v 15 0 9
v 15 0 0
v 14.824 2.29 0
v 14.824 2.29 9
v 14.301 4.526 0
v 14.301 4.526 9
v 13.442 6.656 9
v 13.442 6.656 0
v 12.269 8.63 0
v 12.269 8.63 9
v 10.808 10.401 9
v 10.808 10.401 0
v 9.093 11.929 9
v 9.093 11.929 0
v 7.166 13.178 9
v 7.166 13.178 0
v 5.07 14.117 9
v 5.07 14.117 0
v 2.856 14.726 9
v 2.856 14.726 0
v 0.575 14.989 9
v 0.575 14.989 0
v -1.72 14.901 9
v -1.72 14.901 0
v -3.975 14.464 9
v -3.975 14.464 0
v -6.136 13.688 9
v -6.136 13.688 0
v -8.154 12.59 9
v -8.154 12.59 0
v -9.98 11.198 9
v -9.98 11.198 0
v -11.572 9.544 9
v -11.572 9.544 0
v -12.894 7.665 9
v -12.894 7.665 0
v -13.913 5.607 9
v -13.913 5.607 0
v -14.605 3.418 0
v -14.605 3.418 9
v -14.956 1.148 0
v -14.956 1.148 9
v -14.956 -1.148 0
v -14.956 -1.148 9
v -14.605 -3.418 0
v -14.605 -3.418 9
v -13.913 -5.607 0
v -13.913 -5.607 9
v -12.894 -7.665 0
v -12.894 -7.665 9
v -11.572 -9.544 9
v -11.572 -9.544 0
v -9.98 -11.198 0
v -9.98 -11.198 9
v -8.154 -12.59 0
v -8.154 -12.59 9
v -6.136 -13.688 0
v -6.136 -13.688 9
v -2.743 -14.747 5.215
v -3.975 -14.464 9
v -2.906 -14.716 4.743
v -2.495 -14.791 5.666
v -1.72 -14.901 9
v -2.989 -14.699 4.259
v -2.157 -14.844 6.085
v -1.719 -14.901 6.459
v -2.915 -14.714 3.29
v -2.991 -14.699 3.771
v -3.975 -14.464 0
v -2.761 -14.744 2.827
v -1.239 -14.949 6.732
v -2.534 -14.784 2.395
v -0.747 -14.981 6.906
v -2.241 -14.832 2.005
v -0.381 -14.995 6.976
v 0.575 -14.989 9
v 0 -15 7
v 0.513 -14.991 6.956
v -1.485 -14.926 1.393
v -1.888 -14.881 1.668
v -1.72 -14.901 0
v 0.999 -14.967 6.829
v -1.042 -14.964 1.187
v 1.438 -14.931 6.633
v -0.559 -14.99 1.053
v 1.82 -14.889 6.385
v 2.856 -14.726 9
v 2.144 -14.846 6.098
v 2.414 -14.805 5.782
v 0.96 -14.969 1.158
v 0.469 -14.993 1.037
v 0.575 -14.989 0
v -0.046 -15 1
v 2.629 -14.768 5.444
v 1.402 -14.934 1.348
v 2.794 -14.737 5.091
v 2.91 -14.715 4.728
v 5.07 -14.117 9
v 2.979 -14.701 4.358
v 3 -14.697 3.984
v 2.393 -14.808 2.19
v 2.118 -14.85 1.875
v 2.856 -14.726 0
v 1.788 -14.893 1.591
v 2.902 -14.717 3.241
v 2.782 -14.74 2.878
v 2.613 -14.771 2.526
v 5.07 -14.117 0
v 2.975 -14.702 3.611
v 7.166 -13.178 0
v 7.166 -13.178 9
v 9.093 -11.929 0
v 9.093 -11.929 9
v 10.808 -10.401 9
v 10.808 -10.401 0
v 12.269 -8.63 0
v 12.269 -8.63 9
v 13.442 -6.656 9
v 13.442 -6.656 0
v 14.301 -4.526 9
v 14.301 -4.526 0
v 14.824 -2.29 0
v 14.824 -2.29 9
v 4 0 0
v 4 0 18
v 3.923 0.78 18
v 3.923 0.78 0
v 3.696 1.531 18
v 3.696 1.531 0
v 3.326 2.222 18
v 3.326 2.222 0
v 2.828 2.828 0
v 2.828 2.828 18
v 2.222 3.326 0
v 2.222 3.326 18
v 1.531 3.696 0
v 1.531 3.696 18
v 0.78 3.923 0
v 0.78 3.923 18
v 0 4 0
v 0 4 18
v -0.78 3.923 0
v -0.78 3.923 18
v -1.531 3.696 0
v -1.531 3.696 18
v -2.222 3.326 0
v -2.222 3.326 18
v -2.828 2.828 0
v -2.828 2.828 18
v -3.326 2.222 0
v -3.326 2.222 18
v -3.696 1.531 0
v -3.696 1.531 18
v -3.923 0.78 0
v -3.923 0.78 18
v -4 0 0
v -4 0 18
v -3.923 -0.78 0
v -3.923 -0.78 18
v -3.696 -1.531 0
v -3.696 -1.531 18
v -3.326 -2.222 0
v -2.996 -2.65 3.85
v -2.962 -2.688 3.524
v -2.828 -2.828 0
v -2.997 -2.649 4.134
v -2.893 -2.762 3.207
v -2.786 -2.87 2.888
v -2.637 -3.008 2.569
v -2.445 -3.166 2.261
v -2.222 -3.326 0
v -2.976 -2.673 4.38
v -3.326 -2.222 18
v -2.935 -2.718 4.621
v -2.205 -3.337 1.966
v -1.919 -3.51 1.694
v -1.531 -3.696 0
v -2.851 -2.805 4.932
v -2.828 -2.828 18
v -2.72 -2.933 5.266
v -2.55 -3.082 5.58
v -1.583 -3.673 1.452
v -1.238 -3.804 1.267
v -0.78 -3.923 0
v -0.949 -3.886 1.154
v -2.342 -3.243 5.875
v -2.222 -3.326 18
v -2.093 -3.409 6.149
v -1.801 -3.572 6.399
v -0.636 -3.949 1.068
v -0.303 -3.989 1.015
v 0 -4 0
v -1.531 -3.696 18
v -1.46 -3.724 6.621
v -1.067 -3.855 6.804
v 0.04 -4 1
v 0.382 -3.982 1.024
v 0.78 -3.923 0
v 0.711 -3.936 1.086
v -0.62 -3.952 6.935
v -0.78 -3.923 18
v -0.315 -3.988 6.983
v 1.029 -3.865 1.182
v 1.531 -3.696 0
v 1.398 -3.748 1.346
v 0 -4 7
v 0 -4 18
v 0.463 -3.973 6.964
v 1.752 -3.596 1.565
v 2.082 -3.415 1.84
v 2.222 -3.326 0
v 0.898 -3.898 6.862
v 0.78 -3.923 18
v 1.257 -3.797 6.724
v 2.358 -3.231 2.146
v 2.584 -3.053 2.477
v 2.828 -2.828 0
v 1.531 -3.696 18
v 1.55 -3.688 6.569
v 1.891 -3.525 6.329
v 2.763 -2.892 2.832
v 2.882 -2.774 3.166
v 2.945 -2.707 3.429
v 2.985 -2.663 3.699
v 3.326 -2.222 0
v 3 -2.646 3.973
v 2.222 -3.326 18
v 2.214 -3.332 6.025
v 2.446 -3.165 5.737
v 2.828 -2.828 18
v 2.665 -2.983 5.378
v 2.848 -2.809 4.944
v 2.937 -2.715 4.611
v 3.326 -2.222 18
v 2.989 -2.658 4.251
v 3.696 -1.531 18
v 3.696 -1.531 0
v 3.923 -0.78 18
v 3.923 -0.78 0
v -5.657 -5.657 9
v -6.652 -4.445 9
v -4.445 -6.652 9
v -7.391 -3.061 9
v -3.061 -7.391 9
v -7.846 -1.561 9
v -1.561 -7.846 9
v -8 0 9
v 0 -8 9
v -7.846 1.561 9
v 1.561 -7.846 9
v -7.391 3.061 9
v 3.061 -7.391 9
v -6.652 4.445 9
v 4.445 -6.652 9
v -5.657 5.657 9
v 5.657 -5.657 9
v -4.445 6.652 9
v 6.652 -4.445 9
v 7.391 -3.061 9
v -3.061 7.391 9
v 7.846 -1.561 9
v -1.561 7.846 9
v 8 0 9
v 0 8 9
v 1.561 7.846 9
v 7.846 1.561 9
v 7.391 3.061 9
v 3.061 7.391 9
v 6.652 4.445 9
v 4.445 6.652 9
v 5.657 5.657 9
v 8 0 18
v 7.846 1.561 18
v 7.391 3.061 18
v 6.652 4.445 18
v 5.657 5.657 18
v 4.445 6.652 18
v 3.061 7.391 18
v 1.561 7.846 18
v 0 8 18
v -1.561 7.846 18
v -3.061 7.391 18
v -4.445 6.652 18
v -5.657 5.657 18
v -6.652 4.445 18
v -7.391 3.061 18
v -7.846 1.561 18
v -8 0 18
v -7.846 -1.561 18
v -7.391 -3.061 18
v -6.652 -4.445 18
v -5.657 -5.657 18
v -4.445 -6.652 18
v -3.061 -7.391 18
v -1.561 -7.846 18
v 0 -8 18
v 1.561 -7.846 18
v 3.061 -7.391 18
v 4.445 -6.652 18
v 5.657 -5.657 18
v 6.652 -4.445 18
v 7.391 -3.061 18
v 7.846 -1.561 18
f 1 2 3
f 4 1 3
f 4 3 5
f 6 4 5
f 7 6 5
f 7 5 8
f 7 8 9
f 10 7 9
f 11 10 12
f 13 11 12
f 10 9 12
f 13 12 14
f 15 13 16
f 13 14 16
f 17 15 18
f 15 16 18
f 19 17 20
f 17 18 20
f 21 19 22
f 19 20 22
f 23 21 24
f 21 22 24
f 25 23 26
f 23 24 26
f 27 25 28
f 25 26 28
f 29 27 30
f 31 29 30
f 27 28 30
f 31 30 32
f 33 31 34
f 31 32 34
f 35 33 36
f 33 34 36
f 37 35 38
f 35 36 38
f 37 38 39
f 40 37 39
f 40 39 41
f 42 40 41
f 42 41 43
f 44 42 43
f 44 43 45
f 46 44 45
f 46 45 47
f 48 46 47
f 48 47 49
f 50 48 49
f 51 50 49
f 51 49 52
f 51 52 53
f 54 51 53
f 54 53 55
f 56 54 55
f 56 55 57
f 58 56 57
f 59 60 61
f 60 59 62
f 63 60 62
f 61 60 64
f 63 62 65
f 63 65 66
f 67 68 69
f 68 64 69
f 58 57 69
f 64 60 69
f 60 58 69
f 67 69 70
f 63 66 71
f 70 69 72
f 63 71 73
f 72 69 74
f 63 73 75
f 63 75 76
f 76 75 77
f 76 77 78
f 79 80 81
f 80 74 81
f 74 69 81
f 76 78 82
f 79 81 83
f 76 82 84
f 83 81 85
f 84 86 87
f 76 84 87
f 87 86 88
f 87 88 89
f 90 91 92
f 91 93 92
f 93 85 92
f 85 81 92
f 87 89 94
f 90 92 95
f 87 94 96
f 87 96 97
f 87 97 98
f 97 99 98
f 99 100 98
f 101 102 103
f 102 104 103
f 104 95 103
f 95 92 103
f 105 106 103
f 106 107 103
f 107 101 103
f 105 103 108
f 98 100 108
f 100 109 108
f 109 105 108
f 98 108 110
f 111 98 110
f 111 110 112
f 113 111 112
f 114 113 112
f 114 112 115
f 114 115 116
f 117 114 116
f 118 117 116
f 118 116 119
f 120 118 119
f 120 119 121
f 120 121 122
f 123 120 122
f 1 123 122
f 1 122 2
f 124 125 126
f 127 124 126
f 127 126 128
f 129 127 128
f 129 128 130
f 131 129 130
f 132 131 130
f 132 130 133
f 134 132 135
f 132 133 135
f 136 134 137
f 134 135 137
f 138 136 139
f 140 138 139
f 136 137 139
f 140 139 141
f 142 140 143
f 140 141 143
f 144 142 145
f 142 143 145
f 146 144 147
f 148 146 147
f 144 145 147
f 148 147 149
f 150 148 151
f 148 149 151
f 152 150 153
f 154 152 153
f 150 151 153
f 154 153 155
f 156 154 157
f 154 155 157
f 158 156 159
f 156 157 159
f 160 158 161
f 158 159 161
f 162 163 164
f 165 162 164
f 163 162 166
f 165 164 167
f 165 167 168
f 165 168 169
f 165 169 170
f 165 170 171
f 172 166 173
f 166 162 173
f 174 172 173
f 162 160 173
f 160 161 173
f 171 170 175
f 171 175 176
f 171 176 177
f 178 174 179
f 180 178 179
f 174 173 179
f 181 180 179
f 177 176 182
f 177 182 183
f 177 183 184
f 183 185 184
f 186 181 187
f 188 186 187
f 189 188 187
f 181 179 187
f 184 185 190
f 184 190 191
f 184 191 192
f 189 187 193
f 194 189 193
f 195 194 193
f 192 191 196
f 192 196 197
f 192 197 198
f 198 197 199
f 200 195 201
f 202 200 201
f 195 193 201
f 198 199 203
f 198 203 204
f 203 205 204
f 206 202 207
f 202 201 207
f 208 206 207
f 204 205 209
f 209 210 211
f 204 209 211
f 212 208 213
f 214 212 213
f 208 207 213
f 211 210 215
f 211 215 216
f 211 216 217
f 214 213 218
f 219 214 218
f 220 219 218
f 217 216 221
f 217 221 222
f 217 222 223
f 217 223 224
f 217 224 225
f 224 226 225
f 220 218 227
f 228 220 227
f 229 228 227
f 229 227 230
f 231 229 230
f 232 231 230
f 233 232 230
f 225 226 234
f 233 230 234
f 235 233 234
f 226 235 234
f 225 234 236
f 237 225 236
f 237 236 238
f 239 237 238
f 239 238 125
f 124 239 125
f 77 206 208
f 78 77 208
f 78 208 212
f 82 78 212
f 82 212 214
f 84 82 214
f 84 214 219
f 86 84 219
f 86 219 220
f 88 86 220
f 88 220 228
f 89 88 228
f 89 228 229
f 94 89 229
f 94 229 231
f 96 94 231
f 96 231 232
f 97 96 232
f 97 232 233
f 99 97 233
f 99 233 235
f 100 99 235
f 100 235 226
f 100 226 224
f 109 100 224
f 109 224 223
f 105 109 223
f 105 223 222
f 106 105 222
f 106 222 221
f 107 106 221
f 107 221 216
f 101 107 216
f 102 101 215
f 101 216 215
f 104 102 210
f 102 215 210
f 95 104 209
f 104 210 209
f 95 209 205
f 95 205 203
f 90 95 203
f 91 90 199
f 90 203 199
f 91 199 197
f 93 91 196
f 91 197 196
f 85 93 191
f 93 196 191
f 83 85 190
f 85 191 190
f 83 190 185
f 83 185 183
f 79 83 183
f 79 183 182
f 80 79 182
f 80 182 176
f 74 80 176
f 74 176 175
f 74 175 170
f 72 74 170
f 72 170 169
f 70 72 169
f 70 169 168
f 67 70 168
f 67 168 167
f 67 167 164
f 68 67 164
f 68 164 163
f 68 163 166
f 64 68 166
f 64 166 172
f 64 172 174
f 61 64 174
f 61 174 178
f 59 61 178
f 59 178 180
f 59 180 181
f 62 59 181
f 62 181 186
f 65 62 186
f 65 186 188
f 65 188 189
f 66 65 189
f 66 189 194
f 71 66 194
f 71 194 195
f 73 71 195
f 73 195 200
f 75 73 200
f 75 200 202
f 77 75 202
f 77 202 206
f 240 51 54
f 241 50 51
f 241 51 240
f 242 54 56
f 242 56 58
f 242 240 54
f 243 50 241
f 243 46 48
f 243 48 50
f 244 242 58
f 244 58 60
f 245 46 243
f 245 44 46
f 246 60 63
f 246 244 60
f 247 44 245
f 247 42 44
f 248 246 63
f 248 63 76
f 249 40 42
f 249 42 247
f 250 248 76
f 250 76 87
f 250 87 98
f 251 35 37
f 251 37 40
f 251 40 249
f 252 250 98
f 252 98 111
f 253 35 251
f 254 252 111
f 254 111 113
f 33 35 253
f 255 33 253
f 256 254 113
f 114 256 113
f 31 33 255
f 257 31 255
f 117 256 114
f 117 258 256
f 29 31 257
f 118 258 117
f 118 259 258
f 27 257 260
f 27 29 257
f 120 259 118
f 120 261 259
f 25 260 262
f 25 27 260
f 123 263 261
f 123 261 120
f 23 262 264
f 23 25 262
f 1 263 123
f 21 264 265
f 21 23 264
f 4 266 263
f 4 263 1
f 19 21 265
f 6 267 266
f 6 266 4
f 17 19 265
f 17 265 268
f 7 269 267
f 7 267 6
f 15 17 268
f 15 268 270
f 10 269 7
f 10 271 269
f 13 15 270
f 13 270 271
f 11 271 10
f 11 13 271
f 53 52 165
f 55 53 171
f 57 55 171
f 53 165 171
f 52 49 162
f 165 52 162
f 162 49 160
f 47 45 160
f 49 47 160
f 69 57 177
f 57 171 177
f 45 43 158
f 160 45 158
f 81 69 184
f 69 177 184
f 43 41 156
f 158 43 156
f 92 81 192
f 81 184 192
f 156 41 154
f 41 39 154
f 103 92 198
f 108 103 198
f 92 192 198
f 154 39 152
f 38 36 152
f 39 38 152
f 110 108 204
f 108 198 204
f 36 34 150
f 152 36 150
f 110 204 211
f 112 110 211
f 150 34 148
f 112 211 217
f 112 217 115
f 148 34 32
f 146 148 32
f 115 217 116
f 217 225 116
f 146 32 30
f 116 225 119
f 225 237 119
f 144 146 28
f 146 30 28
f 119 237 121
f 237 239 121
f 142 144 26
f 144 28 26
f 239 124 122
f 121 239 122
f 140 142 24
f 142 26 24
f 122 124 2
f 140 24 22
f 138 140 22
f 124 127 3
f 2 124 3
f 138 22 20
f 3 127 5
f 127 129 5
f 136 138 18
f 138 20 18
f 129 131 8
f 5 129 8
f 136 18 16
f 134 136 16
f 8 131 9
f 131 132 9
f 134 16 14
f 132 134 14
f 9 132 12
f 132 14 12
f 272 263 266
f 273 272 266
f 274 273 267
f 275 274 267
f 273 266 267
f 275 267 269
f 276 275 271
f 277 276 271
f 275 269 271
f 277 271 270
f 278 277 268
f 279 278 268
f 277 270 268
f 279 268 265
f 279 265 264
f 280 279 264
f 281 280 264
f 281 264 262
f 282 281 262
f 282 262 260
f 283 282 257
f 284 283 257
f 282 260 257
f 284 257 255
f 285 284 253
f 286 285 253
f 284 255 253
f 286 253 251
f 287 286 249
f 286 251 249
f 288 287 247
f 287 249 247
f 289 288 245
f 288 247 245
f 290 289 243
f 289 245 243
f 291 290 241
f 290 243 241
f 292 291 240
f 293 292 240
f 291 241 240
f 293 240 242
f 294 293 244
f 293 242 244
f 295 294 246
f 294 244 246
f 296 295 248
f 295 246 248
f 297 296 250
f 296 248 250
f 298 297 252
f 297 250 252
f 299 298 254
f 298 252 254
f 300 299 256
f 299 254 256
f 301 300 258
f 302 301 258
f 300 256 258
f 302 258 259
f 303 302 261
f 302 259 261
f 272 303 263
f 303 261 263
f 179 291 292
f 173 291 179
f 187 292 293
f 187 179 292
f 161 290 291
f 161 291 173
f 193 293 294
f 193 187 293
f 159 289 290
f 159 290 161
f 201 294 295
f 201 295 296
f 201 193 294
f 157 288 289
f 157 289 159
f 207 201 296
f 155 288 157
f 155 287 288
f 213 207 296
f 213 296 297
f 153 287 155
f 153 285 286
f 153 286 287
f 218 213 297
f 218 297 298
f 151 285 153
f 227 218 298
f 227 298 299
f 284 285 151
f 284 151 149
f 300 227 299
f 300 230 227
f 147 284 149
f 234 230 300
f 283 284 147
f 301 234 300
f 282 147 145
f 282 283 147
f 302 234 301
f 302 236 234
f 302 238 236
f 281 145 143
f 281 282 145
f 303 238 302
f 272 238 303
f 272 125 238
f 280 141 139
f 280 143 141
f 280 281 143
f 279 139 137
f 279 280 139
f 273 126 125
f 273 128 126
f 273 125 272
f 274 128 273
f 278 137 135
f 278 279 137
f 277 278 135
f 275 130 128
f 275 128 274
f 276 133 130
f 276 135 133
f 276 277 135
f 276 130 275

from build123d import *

# Parameters (mm, degrees)
SKETCH_1_R          = 15
EXTRUDE_1_DEPTH     = 9
SKETCH_2_R          = 8
EXTRUDE_2_DEPTH     = 9
SKETCH_3_R          = 4
CUT_EXTRUDE_1_DEPTH = 28
SKETCH_4_R          = 3
CUT_EXTRUDE_2_DEPTH = 28


with BuildPart() as part:
    # 草图1 → 凸台-拉伸1 (new body)
    with BuildSketch(Plane.XY):
        Circle(SKETCH_1_R)
    extrude(amount=EXTRUDE_1_DEPTH)

    # 草图2 → 凸台-拉伸2 (add)
    with BuildSketch(Plane.XY.offset(9)):
        Circle(SKETCH_2_R)
    extrude(amount=EXTRUDE_2_DEPTH)

    # 草图3 → 切除-拉伸1 (cut)
    with BuildSketch(Plane.XY.offset(18)):
        Circle(SKETCH_3_R)
    extrude(amount=-CUT_EXTRUDE_1_DEPTH, mode=Mode.SUBTRACT)

    # 草图4 → 切除-拉伸2 (cut)
    with BuildSketch(Plane(origin=(0, 0, 0), x_dir=(1, 0, 0), z_dir=(0, 1, 0))):
        with Locations(Location((0, -4, 0), (0, 0, 270))):
            Circle(SKETCH_4_R)
    extrude(amount=-CUT_EXTRUDE_2_DEPTH, mode=Mode.SUBTRACT)


solid = part.part
